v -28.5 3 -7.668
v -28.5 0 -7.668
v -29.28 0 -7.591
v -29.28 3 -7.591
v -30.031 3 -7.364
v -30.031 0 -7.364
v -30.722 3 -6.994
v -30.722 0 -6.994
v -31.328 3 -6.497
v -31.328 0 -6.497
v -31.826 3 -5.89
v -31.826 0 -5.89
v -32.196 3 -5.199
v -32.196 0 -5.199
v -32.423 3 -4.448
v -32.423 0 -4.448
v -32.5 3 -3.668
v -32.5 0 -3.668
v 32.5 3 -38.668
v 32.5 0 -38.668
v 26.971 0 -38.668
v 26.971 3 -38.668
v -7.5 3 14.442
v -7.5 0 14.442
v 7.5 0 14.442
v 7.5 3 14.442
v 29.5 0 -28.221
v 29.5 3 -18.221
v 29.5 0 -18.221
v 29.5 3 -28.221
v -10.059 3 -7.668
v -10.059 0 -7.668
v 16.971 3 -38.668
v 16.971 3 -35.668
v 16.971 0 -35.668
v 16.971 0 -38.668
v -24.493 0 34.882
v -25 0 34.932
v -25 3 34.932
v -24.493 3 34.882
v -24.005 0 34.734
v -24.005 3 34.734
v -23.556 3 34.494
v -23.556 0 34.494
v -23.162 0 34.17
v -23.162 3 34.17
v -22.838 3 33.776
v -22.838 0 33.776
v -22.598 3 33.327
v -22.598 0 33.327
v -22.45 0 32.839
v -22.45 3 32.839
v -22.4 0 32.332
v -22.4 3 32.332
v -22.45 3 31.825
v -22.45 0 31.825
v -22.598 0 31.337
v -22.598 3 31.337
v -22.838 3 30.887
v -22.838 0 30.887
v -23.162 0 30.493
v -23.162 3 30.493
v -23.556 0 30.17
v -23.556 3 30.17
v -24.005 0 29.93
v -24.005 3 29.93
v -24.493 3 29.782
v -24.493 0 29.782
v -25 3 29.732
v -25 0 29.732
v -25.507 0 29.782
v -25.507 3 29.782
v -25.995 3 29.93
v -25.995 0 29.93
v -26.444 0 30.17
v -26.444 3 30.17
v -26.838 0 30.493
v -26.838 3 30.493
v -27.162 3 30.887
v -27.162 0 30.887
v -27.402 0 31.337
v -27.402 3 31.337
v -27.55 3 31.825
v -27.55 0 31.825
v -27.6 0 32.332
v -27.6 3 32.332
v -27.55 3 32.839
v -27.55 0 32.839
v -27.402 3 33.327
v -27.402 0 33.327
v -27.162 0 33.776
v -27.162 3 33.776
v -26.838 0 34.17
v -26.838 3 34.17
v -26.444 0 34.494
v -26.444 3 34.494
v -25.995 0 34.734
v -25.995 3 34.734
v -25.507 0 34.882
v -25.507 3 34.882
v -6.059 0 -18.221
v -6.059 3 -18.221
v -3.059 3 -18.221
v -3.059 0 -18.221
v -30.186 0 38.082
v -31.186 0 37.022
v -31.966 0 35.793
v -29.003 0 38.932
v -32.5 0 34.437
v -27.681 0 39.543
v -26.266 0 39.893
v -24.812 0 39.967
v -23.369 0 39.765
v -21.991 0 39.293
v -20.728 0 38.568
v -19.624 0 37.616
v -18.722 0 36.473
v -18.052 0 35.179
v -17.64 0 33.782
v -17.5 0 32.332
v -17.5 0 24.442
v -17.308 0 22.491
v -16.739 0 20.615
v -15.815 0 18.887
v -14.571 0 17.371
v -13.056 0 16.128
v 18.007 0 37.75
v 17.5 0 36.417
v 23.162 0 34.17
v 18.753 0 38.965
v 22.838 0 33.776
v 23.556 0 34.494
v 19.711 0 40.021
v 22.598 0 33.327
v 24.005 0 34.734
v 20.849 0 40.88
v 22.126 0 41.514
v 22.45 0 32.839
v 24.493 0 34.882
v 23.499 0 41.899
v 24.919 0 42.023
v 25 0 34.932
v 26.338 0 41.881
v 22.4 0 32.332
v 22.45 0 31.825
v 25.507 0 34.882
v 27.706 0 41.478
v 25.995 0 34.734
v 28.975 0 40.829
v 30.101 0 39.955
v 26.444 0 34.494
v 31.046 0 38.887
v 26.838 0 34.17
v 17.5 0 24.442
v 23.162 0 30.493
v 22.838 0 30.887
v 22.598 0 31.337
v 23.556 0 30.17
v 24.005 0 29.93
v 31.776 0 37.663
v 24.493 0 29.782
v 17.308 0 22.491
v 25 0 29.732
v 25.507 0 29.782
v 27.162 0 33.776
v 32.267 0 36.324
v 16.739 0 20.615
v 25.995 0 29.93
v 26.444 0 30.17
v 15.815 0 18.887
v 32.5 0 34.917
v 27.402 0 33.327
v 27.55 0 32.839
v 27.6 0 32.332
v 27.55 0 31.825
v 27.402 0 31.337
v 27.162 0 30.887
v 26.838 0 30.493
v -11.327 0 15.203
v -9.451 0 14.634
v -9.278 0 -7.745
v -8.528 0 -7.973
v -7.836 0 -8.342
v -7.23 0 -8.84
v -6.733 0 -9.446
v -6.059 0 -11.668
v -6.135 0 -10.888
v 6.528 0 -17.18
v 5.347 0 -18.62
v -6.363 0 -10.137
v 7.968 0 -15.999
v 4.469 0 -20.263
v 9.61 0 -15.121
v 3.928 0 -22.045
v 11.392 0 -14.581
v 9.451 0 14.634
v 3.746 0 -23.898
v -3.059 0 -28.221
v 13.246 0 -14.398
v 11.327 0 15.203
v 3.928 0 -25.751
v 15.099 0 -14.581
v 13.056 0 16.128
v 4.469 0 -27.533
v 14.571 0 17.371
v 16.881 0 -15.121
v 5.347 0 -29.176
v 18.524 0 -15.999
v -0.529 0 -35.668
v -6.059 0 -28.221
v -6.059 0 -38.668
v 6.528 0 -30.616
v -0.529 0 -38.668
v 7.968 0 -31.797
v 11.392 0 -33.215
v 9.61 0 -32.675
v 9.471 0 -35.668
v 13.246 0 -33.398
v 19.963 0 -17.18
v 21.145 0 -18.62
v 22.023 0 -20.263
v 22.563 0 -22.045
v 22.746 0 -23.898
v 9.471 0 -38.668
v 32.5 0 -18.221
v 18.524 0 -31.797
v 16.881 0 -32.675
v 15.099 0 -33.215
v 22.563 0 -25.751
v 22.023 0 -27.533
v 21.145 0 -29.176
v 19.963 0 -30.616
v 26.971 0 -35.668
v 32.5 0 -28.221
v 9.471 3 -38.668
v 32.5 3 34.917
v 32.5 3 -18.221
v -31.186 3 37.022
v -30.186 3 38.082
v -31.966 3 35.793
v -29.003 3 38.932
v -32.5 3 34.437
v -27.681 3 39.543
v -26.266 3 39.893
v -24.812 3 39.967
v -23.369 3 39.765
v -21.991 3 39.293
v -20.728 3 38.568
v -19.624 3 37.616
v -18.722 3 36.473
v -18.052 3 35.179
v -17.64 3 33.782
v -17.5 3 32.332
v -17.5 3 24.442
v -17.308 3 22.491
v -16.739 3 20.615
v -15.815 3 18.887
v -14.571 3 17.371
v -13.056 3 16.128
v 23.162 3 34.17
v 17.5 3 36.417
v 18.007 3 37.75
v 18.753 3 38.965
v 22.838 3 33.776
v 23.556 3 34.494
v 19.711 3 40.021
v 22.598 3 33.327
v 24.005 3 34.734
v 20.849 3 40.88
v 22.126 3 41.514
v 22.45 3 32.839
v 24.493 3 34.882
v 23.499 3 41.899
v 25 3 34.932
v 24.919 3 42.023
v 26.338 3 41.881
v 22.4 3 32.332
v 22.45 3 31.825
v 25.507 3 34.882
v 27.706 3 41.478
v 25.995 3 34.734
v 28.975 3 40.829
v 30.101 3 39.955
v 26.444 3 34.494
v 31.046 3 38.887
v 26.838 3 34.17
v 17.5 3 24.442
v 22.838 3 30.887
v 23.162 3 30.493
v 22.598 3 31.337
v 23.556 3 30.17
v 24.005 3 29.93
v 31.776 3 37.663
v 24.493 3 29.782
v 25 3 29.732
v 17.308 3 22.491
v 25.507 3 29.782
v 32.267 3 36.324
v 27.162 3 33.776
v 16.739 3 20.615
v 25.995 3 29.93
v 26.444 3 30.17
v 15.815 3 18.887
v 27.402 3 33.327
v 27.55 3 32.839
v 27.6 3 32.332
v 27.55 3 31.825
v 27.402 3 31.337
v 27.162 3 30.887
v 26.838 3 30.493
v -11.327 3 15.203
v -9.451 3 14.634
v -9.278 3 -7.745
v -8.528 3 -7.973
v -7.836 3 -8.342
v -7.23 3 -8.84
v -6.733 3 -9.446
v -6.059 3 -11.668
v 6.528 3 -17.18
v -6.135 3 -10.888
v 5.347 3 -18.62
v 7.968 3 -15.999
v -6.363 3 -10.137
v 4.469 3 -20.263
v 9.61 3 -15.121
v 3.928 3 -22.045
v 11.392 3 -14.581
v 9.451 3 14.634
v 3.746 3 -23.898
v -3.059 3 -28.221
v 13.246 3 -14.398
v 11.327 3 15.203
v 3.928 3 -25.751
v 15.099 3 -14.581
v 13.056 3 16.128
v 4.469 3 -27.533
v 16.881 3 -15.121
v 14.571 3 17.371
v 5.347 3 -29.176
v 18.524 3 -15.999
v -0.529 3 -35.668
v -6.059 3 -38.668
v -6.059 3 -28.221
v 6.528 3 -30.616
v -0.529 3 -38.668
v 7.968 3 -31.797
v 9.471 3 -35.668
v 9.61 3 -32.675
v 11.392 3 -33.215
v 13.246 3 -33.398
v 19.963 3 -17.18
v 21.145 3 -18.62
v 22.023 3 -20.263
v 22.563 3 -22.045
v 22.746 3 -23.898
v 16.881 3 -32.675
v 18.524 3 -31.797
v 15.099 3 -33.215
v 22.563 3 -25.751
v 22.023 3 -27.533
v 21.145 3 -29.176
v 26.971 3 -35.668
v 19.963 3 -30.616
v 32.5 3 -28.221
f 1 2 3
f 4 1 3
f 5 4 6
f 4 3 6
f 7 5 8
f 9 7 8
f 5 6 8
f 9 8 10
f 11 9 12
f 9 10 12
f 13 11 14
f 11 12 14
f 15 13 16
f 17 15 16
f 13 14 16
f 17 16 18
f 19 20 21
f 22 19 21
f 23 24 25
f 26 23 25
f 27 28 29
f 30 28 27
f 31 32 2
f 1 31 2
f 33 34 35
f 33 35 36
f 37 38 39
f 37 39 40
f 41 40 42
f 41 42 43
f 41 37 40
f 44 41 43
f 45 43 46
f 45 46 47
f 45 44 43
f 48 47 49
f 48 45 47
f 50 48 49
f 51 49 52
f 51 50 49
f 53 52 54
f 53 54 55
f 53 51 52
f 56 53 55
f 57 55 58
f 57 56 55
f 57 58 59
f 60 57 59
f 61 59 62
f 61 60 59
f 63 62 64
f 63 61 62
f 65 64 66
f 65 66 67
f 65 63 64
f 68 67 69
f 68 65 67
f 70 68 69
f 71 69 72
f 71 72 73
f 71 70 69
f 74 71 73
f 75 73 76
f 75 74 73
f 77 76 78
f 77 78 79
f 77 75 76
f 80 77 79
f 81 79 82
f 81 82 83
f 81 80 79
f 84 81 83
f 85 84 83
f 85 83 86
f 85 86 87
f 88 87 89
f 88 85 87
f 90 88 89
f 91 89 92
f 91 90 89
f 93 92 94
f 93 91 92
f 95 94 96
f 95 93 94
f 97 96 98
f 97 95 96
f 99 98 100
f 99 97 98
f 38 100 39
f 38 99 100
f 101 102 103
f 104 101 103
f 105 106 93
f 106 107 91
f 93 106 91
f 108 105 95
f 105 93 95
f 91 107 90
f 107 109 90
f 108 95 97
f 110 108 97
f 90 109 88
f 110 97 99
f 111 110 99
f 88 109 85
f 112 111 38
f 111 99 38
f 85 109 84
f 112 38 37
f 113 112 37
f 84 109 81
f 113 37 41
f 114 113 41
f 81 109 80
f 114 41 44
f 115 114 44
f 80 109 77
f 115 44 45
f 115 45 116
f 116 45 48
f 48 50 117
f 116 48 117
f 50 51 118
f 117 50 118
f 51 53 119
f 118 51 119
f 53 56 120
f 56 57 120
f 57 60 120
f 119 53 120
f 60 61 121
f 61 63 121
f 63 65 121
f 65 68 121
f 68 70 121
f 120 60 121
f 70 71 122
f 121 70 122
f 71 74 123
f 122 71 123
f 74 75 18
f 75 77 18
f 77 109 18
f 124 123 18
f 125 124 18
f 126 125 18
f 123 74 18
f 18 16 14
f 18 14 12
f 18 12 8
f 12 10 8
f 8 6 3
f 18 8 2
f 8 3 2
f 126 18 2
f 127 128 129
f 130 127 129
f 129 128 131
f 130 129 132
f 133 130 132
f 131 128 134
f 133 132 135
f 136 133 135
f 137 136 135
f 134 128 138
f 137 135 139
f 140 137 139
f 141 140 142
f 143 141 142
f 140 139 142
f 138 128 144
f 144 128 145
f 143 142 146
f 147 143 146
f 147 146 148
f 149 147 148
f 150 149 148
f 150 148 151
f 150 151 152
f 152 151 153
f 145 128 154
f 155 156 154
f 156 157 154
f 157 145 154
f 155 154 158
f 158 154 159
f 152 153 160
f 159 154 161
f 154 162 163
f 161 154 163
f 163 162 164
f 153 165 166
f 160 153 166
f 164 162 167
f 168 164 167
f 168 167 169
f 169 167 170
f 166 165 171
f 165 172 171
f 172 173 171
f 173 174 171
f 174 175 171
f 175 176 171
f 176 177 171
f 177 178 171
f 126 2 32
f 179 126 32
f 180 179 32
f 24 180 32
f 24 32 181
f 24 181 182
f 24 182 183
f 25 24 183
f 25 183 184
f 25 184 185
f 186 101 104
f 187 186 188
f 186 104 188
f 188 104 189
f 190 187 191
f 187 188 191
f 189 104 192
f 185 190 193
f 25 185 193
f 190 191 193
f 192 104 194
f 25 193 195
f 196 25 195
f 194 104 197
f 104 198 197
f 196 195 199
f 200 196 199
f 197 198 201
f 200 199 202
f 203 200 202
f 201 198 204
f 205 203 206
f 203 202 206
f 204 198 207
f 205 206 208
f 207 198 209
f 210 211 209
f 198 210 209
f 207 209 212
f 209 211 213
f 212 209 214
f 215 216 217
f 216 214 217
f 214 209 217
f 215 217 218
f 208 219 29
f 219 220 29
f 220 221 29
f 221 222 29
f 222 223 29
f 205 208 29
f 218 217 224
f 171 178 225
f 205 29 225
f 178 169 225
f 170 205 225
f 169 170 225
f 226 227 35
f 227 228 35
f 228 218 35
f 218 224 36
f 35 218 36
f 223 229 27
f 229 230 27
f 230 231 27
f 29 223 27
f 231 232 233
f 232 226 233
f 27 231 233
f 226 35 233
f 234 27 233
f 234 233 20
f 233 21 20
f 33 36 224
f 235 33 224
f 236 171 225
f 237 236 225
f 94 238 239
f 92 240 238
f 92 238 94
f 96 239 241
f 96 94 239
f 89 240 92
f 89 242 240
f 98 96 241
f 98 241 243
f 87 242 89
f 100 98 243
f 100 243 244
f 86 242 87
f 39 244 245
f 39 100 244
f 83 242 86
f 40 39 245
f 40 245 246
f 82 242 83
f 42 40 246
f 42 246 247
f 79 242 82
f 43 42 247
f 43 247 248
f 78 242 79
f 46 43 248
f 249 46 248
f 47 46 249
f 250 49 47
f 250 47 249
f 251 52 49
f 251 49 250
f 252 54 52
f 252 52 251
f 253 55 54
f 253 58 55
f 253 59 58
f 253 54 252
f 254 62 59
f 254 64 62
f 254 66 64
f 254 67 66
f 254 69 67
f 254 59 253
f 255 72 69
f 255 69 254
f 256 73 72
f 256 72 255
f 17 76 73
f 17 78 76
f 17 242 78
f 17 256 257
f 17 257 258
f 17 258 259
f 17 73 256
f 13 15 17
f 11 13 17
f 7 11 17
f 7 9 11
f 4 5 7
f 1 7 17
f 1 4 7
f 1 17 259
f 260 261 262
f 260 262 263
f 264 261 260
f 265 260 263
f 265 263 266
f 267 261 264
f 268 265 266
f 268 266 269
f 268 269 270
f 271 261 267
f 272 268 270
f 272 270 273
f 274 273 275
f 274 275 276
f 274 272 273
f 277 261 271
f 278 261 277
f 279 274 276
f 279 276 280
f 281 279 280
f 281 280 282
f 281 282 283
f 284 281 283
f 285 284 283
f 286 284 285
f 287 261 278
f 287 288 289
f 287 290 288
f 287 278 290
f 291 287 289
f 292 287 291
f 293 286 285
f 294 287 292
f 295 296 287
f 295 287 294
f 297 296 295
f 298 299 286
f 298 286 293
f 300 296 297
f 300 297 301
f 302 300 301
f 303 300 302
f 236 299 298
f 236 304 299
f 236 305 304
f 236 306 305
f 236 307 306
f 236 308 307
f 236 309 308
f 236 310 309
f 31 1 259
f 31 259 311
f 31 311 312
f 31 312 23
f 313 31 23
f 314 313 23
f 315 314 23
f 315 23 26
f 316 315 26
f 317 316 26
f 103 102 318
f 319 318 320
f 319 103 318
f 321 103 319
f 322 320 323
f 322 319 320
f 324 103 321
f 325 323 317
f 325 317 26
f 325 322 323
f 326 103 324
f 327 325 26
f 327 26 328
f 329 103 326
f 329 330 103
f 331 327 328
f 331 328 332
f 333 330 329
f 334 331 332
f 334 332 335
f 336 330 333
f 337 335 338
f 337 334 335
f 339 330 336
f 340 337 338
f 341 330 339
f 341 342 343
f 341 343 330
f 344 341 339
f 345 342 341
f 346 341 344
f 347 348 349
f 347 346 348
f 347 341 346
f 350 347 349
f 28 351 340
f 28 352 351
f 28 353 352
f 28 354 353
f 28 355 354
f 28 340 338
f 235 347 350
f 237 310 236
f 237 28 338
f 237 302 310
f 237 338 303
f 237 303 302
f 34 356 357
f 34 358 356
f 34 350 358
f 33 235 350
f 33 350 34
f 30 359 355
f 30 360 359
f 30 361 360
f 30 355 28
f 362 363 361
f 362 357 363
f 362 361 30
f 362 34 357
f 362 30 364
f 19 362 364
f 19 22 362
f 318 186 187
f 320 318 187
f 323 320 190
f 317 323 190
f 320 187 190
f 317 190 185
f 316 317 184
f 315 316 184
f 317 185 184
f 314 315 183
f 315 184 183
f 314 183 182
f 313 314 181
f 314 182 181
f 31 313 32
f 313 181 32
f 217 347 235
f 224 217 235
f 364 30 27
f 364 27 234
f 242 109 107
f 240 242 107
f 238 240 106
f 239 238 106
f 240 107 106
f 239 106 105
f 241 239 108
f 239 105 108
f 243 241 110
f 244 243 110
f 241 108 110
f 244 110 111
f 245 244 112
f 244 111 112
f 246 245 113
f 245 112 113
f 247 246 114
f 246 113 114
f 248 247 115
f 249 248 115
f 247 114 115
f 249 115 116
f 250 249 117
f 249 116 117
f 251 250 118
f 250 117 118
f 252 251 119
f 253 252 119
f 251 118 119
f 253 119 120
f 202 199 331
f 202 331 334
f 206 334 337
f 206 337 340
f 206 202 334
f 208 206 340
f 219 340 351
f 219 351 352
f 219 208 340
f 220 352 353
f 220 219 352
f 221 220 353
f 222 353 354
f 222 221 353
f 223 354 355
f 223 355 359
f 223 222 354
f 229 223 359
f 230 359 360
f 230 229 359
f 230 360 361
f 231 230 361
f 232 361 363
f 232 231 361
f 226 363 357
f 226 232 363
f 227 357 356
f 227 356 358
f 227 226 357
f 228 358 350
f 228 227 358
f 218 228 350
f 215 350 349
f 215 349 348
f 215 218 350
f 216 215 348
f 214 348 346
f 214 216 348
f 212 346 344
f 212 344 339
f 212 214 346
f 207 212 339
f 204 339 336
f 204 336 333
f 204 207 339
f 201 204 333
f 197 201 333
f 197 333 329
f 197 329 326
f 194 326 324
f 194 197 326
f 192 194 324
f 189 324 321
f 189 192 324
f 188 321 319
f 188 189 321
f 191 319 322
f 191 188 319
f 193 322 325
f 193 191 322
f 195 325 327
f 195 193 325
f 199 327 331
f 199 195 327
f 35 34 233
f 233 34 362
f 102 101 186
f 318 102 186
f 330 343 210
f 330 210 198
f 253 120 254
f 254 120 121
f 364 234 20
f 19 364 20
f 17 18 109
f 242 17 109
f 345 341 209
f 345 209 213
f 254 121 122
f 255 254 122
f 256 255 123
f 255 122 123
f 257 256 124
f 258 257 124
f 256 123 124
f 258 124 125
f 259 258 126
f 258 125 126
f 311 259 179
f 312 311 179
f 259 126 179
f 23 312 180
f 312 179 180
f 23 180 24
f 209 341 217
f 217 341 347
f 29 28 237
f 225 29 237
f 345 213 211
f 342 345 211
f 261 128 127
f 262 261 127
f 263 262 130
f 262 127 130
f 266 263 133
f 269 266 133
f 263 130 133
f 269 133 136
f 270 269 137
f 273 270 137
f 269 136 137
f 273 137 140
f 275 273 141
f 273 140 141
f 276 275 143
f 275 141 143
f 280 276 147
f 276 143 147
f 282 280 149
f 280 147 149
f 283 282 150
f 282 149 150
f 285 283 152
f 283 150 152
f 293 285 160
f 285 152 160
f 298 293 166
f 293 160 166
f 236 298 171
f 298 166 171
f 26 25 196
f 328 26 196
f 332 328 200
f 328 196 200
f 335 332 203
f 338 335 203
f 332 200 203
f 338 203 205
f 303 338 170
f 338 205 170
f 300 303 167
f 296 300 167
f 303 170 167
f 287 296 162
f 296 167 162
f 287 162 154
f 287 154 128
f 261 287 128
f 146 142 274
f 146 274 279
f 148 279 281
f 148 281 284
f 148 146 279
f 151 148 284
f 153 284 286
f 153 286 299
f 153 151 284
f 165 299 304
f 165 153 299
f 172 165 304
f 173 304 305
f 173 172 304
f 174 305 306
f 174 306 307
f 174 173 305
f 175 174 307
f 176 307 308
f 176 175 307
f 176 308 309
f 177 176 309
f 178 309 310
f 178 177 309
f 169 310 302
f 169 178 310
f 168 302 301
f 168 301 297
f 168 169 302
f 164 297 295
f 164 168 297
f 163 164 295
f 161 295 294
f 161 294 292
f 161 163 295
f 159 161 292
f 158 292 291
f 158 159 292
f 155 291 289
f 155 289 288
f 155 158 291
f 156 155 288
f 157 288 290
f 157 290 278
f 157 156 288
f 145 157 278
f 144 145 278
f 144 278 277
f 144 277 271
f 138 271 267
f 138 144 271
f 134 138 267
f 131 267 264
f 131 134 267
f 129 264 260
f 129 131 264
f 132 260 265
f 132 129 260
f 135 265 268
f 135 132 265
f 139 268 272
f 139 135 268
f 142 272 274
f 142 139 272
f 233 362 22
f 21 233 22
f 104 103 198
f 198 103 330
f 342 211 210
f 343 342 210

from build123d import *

# Parameters (mm, degrees)
SKETCH1_R           = 2.6
SKETCH1_R_2         = 9.5
BOSS_EXTRUDE1_DEPTH = 3
SKETCH2_W           = 10
SKETCH2_H           = 3
SKETCH2_W_2         = 3
SKETCH2_H_2         = 10
CUT_EXTRUDE1_DEPTH  = 3


with BuildPart() as part:
    # Sketch1 → Boss-Extrude1 (new body)
    with BuildSketch(Plane(origin=(0, 0, 0), x_dir=(1, 0, 0), z_dir=(0, 1, 0))):
        with BuildLine():
            Line((-32.5, -1.331915835), (-32.5, -34.437048929))
            ThreePointArc((-32.5, -34.437048929), (-24.085532921, -39.90046288), (-17.5, -32.331915835))
            Line((-17.5, -32.331915835), (-17.5, -24.442231617))
            ThreePointArc((-17.5, -24.442231617), (-14.571067812, -17.371163805), (-7.5, -14.442231617))
            Line((-7.5, -14.442231617), (7.5, -14.442231617))
            ThreePointArc((7.5, -14.442231617), (14.571067812, -17.371163805), (17.5, -24.442231617))
            Line((17.5, -24.442231617), (17.5, -32.331915835))
            Line((17.5, -32.331915835), (17.5, -36.417098288))
            ThreePointArc((17.5, -36.417098288), (25.631797985, -41.985078136), (32.5, -34.917098288))
            Line((32.5, -34.917098288), (32.5, -33.831915835))
            Line((32.5, -33.831915835), (32.5, -1.331915835))
            Line((32.5, -1.331915835), (32.5, 3.668084165))
            Line((32.5, 3.668084165), (32.5, 38.668084165))
            Line((32.5, 38.668084165), (32.441371292, 38.668084165))
            Line((32.441371292, 38.668084165), (-6.058628708, 38.668084165))
            Line((-6.058628708, 38.668084165), (-6.058628708, 14.168084165))
            Line((-6.058628708, 14.168084165), (-6.058628708, 11.668084165))
            ThreePointArc((-6.058628708, 11.668084165), (-7.230201584, 8.83965704), (-10.058628708, 7.668084165))
            Line((-10.058628708, 7.668084165), (-28.5, 7.668084165))
            ThreePointArc((-28.5, 7.668084165), (-31.328427125, 6.49651129), (-32.5, 3.668084165))
            Line((-32.5, 3.668084165), (-32.5, 3.101498414))
            Line((-32.5, 3.101498414), (-32.5, -1.331915835))
        make_face()
        with Locations(Location((-25, -32.331915835, 0), (0, 0, 270))):
            Circle(SKETCH1_R, mode=Mode.SUBTRACT)
        with Locations(Location((25, -32.331915835, 0), (0, 0, 270))):
            Circle(SKETCH1_R, mode=Mode.SUBTRACT)
        with Locations(Location((13.245823136, 23.897996209, 0), (0, 0, 270))):
            Circle(SKETCH1_R_2, mode=Mode.SUBTRACT)
    extrude(amount=BOSS_EXTRUDE1_DEPTH)

    # Sketch2 → Cut-Extrude1 (cut)
    with BuildSketch(Plane(origin=(0, 3, 0), x_dir=(1, 0, 0), z_dir=(0, 1, 0))):
        with Locations((4.470685646, 37.168084165)):
            Rectangle(SKETCH2_W, SKETCH2_H)
        with Locations((-4.558628708, 23.22062572)):
            Rectangle(SKETCH2_W_2, SKETCH2_H_2)
        with Locations((21.970685646, 37.168084165)):
            Rectangle(SKETCH2_W, SKETCH2_H)
        with Locations((31, 23.22062572)):
            Rectangle(SKETCH2_W_2, SKETCH2_H_2)
    extrude(amount=-CUT_EXTRUDE1_DEPTH, mode=Mode.SUBTRACT)


solid = part.part
